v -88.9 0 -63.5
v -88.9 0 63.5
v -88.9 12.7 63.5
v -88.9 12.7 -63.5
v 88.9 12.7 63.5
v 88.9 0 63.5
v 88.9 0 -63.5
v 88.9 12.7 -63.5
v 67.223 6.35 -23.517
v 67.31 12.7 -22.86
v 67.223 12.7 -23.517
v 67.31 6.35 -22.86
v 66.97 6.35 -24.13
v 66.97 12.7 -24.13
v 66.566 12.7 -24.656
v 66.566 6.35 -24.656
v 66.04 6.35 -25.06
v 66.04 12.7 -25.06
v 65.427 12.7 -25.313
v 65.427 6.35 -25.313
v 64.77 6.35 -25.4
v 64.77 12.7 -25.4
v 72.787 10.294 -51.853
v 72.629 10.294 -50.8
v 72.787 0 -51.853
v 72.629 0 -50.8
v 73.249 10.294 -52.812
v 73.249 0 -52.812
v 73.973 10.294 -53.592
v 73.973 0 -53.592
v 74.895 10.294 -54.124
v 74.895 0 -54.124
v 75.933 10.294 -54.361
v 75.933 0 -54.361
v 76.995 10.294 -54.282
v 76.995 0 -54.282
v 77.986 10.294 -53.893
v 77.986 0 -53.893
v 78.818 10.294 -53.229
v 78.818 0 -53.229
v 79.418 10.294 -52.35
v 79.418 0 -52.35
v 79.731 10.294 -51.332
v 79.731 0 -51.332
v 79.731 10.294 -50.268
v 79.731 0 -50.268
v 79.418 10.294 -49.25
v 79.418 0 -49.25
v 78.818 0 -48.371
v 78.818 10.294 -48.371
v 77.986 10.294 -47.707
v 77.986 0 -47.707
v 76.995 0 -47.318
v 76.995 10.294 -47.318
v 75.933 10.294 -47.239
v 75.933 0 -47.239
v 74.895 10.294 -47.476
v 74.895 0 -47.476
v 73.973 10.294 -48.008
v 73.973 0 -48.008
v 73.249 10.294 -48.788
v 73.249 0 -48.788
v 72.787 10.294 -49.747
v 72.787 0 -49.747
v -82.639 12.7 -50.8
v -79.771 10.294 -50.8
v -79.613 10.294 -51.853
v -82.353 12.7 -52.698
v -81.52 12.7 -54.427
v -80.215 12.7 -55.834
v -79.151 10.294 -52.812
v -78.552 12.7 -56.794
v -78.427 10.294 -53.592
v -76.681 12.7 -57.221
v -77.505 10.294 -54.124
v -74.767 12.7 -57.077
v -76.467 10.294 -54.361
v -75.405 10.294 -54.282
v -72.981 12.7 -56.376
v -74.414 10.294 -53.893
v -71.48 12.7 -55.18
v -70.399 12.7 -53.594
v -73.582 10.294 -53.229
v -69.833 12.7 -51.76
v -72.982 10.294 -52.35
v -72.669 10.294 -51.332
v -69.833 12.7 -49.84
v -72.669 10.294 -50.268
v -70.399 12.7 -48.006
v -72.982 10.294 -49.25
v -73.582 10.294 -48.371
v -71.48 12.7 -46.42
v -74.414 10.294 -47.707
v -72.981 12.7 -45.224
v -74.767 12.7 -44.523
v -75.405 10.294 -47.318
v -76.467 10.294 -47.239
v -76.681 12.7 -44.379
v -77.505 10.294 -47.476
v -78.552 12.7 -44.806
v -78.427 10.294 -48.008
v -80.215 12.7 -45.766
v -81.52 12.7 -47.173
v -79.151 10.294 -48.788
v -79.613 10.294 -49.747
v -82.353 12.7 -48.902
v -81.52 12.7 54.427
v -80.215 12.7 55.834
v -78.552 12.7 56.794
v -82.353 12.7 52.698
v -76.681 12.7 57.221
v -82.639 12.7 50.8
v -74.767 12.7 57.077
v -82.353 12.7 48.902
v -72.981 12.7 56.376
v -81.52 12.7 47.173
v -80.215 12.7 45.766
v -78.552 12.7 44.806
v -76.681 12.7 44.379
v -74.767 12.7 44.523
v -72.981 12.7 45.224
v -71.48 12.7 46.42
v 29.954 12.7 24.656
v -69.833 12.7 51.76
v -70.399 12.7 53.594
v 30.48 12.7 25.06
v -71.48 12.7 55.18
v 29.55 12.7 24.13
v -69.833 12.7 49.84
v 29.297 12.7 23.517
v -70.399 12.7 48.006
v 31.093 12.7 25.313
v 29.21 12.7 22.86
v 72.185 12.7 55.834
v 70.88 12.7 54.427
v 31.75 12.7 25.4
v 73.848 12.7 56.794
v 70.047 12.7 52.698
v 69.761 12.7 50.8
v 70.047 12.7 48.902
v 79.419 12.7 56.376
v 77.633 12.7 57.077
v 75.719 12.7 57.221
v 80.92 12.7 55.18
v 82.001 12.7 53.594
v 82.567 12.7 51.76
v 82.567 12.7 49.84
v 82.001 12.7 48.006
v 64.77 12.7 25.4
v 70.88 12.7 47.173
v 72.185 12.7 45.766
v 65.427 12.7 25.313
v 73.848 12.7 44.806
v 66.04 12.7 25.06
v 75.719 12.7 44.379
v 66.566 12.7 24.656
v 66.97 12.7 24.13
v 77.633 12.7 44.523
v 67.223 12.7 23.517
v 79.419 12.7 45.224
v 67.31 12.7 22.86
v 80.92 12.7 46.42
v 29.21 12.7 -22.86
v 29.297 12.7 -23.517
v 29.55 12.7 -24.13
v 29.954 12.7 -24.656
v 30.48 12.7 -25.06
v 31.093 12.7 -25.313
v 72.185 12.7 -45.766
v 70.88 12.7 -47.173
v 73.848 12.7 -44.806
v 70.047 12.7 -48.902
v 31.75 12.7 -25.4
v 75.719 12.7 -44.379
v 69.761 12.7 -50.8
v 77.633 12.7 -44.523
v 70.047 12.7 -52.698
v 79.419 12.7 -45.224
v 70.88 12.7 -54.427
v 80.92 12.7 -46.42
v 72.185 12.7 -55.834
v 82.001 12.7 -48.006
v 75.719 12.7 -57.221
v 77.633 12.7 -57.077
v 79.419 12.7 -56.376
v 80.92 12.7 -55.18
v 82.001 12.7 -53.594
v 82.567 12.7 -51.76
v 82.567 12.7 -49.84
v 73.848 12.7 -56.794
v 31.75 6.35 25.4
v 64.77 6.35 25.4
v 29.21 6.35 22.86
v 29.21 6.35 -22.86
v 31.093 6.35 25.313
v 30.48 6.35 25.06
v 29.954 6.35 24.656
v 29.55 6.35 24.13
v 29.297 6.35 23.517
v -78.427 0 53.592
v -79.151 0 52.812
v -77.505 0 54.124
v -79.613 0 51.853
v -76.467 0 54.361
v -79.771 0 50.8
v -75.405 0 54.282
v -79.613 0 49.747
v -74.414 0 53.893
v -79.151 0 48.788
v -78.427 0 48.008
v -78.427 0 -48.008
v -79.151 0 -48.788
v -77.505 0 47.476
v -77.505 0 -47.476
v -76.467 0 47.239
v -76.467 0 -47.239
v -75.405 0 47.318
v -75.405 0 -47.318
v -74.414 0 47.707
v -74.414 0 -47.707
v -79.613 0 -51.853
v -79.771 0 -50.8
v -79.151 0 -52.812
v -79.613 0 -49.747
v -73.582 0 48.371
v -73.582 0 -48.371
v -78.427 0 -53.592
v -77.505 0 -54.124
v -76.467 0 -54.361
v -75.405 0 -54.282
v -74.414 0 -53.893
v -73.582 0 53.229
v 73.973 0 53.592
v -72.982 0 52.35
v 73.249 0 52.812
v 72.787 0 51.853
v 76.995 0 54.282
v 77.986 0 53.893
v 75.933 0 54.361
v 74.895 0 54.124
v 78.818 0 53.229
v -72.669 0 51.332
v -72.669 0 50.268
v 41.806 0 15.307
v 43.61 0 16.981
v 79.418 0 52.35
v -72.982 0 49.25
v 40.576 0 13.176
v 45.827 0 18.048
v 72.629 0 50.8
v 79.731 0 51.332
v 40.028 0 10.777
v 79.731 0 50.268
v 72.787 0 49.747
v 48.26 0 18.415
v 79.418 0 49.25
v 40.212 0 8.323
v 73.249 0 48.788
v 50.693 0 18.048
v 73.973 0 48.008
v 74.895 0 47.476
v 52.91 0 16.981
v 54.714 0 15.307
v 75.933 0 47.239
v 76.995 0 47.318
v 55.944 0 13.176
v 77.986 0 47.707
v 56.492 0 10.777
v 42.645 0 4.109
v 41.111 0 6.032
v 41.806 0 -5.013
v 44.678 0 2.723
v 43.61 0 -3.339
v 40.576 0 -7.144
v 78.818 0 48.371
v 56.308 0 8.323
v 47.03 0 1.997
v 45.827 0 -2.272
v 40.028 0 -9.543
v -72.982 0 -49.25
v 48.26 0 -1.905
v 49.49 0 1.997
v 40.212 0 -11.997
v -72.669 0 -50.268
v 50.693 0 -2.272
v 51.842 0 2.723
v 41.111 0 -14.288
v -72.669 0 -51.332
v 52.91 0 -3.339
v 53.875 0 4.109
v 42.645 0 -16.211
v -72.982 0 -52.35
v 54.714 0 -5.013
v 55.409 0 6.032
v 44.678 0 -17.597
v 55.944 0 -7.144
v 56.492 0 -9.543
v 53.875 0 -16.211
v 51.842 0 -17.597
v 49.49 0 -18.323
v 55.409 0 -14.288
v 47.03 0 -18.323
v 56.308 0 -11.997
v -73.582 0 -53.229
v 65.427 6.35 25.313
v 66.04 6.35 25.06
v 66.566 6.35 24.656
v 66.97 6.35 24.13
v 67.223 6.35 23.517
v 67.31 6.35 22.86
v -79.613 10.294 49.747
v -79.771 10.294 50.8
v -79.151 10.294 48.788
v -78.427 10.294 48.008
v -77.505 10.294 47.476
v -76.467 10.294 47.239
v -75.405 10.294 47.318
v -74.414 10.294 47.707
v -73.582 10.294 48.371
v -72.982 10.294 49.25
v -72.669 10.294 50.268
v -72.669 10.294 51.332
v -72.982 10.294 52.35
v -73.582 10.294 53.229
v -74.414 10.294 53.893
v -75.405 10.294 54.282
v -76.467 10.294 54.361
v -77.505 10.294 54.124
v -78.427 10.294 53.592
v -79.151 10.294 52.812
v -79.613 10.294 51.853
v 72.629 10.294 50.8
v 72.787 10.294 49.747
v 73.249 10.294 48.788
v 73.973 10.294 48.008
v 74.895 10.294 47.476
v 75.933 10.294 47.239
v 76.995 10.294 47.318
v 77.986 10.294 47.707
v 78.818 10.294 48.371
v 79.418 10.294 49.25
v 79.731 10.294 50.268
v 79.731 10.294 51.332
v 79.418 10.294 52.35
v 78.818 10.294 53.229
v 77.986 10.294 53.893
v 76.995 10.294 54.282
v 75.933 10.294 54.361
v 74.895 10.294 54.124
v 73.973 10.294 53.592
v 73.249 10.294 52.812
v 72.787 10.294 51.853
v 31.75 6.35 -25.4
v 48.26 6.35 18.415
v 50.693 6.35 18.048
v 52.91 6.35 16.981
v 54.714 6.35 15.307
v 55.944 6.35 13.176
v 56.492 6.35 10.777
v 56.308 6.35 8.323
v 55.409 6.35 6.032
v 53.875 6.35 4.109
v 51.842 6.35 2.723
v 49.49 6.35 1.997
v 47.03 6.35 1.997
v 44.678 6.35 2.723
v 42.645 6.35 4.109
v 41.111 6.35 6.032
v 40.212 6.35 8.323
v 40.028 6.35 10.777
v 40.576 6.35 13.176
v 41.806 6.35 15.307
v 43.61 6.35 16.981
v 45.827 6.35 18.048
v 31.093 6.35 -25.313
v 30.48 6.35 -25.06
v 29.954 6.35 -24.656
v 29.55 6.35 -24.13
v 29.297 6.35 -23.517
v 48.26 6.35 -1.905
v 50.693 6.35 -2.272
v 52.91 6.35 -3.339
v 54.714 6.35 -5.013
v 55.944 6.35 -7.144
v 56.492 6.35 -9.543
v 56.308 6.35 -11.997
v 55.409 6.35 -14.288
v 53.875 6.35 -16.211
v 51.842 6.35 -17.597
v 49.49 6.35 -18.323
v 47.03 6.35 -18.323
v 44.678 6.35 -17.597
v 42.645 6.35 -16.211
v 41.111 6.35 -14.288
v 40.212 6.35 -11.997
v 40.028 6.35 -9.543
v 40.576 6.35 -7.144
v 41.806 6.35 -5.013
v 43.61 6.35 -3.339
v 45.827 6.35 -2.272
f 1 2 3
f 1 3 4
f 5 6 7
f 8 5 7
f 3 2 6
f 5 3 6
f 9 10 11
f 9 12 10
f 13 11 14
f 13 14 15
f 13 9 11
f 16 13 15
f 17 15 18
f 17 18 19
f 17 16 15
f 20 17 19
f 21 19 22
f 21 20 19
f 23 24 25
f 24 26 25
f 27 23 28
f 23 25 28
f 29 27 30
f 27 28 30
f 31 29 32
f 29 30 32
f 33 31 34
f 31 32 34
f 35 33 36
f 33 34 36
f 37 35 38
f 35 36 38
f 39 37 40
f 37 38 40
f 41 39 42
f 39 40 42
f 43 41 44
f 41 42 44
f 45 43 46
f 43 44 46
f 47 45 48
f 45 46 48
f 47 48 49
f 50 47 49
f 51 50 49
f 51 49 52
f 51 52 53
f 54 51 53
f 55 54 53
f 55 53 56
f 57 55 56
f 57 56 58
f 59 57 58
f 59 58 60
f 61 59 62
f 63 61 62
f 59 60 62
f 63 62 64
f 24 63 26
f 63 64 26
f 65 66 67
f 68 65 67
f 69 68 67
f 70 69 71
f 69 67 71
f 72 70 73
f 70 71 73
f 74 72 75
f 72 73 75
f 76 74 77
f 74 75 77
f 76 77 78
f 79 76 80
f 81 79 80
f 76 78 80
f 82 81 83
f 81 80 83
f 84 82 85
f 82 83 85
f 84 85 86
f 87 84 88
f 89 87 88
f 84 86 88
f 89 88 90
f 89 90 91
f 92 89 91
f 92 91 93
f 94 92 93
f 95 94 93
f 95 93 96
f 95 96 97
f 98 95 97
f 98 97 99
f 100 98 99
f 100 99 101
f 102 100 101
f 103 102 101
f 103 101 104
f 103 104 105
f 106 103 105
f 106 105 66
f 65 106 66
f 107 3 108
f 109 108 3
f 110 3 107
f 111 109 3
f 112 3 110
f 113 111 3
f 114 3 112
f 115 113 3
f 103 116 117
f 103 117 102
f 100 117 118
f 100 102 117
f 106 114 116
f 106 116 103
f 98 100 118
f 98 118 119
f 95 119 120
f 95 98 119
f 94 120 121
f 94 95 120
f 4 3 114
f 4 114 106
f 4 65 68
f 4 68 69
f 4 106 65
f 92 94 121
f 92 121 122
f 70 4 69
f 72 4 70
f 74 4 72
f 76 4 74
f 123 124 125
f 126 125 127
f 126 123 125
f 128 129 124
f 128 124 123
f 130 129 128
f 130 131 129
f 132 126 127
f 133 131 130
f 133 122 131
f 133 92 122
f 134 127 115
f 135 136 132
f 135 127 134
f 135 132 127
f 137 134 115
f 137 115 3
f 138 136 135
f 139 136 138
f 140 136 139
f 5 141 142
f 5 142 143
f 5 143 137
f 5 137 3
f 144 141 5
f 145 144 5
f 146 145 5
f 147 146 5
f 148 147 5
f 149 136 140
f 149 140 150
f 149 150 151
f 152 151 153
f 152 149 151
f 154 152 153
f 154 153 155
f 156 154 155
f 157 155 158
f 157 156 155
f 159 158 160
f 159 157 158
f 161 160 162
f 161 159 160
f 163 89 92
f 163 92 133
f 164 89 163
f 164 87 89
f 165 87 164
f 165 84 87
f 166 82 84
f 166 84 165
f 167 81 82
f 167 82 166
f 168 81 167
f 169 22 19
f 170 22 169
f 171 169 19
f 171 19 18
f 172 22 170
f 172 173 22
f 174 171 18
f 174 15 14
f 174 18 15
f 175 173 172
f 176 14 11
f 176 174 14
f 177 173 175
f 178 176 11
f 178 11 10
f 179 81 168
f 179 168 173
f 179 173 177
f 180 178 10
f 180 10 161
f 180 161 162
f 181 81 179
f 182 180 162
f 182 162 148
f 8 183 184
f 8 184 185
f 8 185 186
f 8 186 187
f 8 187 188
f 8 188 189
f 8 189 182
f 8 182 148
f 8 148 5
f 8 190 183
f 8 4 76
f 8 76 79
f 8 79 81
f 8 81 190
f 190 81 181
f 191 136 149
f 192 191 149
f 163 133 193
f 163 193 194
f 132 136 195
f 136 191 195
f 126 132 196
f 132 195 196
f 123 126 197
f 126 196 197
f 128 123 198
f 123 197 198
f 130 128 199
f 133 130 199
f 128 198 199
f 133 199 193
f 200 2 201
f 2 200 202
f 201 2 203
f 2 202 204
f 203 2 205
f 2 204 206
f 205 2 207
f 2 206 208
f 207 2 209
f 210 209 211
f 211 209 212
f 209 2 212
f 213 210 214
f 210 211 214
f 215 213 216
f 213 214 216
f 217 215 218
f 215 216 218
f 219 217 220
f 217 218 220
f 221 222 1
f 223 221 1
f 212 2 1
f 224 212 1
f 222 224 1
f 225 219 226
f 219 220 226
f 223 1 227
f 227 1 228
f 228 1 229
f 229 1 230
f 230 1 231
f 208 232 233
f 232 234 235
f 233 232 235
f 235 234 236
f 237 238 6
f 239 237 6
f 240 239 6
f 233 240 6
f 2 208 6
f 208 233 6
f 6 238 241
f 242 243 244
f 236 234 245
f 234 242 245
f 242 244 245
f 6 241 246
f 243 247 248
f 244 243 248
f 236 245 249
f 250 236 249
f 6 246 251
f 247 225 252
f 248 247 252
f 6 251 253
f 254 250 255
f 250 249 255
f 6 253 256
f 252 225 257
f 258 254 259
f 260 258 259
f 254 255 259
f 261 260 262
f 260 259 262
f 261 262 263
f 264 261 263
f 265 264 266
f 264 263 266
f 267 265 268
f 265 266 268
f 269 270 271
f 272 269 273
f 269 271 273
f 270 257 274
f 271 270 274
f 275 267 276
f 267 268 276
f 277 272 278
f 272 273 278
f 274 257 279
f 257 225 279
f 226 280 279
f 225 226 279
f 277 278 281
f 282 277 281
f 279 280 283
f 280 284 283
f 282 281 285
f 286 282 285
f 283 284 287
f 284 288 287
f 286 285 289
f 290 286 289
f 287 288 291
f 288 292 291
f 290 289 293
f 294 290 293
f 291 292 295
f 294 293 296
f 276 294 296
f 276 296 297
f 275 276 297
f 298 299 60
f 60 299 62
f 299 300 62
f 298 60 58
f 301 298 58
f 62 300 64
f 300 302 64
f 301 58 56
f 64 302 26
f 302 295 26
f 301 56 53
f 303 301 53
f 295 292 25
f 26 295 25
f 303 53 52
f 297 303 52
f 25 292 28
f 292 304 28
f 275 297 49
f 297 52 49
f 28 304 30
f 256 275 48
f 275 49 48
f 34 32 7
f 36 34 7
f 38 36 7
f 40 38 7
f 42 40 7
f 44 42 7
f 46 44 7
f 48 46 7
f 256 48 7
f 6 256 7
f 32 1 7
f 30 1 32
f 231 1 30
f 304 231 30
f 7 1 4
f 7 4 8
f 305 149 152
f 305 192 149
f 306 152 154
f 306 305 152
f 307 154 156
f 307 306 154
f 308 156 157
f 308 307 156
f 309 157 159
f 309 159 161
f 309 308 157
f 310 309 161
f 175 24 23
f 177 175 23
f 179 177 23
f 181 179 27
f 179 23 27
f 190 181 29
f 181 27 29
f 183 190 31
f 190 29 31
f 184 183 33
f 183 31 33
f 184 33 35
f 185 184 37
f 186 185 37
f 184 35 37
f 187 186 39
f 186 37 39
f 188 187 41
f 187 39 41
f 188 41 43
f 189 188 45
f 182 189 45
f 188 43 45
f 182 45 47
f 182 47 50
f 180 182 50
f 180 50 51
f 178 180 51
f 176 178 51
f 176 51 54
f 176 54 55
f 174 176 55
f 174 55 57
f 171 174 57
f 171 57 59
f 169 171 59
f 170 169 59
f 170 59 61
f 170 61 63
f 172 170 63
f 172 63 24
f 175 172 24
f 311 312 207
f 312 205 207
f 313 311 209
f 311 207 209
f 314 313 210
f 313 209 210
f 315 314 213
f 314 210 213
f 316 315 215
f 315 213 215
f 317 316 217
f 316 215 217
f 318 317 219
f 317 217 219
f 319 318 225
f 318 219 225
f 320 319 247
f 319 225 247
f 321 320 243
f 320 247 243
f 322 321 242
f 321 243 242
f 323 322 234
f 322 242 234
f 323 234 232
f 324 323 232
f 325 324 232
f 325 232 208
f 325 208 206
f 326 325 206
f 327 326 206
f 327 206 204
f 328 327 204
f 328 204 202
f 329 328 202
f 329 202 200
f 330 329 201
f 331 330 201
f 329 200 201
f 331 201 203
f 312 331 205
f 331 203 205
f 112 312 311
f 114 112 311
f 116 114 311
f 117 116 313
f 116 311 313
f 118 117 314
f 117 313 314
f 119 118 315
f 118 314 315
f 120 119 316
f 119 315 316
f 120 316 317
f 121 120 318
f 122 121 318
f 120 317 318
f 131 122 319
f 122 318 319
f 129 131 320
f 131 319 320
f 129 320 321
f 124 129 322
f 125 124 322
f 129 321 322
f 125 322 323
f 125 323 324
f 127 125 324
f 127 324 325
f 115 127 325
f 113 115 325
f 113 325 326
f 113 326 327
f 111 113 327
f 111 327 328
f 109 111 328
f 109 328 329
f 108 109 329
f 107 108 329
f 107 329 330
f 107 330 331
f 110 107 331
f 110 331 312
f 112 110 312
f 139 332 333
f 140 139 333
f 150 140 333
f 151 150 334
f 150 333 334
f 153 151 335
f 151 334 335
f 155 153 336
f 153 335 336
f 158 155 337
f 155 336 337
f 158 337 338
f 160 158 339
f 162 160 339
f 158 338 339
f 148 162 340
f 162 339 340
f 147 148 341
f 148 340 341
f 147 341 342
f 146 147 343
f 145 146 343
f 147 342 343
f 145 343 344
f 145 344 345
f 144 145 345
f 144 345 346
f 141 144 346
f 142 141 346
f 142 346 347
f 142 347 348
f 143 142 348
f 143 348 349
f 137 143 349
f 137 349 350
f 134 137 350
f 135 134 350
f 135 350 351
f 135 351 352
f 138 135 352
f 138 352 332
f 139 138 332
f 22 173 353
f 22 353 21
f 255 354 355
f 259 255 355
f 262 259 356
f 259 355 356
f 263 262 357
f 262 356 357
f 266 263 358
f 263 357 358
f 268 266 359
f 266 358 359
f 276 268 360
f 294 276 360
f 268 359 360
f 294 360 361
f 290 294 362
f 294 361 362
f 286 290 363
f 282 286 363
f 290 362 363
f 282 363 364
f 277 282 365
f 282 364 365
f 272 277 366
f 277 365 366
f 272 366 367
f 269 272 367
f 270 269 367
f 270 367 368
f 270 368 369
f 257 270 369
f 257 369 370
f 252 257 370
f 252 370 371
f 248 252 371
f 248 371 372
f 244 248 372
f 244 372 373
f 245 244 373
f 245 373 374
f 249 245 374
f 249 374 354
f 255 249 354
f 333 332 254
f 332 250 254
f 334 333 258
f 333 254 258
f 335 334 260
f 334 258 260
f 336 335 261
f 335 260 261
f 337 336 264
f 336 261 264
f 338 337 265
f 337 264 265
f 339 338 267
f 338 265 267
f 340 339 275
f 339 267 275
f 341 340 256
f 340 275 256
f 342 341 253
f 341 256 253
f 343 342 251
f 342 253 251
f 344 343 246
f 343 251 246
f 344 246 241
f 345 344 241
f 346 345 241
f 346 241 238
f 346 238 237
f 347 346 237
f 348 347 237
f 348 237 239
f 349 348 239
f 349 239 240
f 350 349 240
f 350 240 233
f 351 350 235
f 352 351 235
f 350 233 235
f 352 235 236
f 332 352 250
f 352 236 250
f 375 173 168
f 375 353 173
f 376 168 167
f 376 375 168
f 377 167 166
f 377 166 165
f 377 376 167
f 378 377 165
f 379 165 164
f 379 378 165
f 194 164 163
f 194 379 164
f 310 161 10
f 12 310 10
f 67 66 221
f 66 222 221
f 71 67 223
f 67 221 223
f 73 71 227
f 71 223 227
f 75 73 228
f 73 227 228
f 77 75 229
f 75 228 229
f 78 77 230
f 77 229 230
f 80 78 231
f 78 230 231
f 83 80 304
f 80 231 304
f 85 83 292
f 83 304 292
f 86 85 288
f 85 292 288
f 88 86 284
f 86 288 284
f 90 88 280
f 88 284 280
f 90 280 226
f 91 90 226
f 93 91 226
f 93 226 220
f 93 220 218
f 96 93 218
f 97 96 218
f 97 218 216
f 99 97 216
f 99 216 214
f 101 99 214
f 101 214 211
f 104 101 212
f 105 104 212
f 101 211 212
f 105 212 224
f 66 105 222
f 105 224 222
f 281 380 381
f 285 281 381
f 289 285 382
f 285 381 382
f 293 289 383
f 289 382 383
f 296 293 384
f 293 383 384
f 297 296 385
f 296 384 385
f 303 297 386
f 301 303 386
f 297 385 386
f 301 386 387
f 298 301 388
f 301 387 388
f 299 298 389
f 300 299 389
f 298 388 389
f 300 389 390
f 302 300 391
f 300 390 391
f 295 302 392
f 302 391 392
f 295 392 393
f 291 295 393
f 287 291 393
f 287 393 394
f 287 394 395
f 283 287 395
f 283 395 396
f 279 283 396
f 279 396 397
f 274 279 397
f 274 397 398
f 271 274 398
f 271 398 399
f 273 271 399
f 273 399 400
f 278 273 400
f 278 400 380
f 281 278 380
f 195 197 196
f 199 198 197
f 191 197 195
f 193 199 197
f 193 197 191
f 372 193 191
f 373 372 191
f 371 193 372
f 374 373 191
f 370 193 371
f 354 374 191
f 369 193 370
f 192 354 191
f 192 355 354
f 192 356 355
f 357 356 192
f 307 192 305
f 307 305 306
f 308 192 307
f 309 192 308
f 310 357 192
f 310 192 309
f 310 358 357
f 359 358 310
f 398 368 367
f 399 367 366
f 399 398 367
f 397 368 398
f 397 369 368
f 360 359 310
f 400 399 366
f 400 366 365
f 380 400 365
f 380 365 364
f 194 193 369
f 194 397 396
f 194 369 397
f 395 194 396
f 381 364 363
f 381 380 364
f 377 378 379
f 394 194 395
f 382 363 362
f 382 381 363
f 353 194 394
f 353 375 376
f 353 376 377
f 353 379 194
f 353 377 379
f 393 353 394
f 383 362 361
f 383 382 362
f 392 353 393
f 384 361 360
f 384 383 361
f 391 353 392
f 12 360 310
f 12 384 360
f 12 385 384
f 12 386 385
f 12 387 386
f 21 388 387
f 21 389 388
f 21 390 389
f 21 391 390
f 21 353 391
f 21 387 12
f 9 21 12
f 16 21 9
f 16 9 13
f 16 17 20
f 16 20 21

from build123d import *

# Parameters (mm, degrees)
SKETCH1_W                                           = 177.8
SKETCH1_H                                           = 127
BOSS_EXTRUDE1_DEPTH                                 = 12.7
CSK_FOR_1_4_FLAT_HEAD_MACHINE_SCREW_100_D           = 7.14248
CSK_FOR_1_4_FLAT_HEAD_MACHINE_SCREW_100_CSINK_D     = 12.8778
CSK_FOR_1_4_FLAT_HEAD_MACHINE_SCREW_100_CSINK_ANGLE = 100
SKETCH6_W                                           = 38.1
SKETCH6_H                                           = 50.8
CUT_EXTRUDE1_DEPTH                                  = 6.35
CUT_EXTRUDE2_REACH                                  = 111.434
SKETCH8_R                                           = 8.255
CUT_EXTRUDE3_REACH                                  = 111.434
SKETCH7_R                                           = 8.255
FILLET1_R                                           = 2.54


with BuildPart() as part:
    # Sketch1 → Boss-Extrude1 (new body)
    with BuildSketch(Plane(origin=(0, 0, 0), x_dir=(1, 0, 0), z_dir=(0, 1, 0))):
        Rectangle(SKETCH1_W, SKETCH1_H)
    extrude(amount=BOSS_EXTRUDE1_DEPTH)

    # CSK for 1/4 Flat Head Machine Screw (100)1 (through all)
    with Locations(Plane(origin=(0, 12.7, 0), x_dir=(1, 0, 0), z_dir=(0, 1, 0))):
        with Locations((-76.2, -50.8), (76.2, -50.8), (76.2, 50.8), (-76.2, 50.8)):
            CounterSinkHole(CSK_FOR_1_4_FLAT_HEAD_MACHINE_SCREW_100_D / 2, CSK_FOR_1_4_FLAT_HEAD_MACHINE_SCREW_100_CSINK_D / 2, counter_sink_angle=CSK_FOR_1_4_FLAT_HEAD_MACHINE_SCREW_100_CSINK_ANGLE)

    # Sketch6 → Cut-Extrude1 (cut)
    with BuildSketch(Plane(origin=(0, 12.7, 0), x_dir=(1, 0, 0), z_dir=(0, 1, 0))):
        with Locations((48.26, 0)):
            Rectangle(SKETCH6_W, SKETCH6_H)
    extrude(amount=-CUT_EXTRUDE1_DEPTH, mode=Mode.SUBTRACT)

    # Sketch8 → Cut-Extrude2 (cut, up to next)
    with BuildSketch(Plane(origin=(0, 6.35, 0), x_dir=(1, 0, 0), z_dir=(0, 1, 0)), mode=Mode.PRIVATE) as cut_extrude2_sk1:
        with Locations(Location((48.26, 10.16, 0), (0, 0, 270))):
            Circle(SKETCH8_R)
    cut_extrude2_tool1 = extrude(cut_extrude2_sk1.sketch, amount=-CUT_EXTRUDE2_REACH, mode=Mode.PRIVATE) & part.part
    add(cut_extrude2_tool1.solids().sort_by_distance((48.26, 6.35, -10.16))[0], mode=Mode.SUBTRACT)

    # Sketch7 → Cut-Extrude3 (cut, up to next)
    with BuildSketch(Plane(origin=(0, 6.35, 0), x_dir=(1, 0, 0), z_dir=(0, 1, 0)), mode=Mode.PRIVATE) as cut_extrude3_sk1:
        with Locations(Location((48.26, -10.16, 0), (0, 0, 270))):
            Circle(SKETCH7_R)
    cut_extrude3_tool1 = extrude(cut_extrude3_sk1.sketch, amount=-CUT_EXTRUDE3_REACH, mode=Mode.PRIVATE) & part.part
    add(cut_extrude3_tool1.solids().sort_by_distance((48.26, 6.35, 10.16))[0], mode=Mode.SUBTRACT)

    # Fillet1
    fillet1_edges = [part.edges().sort_by_distance(p)[0] for p in [
        (29.21, 9.525, -25.4),
        (67.31, 9.525, -25.4),
        (67.31, 9.525, 25.4),
        (29.21, 9.525, 25.4),
    ]]
    fillet(fillet1_edges, radius=FILLET1_R)


solid = part.part
